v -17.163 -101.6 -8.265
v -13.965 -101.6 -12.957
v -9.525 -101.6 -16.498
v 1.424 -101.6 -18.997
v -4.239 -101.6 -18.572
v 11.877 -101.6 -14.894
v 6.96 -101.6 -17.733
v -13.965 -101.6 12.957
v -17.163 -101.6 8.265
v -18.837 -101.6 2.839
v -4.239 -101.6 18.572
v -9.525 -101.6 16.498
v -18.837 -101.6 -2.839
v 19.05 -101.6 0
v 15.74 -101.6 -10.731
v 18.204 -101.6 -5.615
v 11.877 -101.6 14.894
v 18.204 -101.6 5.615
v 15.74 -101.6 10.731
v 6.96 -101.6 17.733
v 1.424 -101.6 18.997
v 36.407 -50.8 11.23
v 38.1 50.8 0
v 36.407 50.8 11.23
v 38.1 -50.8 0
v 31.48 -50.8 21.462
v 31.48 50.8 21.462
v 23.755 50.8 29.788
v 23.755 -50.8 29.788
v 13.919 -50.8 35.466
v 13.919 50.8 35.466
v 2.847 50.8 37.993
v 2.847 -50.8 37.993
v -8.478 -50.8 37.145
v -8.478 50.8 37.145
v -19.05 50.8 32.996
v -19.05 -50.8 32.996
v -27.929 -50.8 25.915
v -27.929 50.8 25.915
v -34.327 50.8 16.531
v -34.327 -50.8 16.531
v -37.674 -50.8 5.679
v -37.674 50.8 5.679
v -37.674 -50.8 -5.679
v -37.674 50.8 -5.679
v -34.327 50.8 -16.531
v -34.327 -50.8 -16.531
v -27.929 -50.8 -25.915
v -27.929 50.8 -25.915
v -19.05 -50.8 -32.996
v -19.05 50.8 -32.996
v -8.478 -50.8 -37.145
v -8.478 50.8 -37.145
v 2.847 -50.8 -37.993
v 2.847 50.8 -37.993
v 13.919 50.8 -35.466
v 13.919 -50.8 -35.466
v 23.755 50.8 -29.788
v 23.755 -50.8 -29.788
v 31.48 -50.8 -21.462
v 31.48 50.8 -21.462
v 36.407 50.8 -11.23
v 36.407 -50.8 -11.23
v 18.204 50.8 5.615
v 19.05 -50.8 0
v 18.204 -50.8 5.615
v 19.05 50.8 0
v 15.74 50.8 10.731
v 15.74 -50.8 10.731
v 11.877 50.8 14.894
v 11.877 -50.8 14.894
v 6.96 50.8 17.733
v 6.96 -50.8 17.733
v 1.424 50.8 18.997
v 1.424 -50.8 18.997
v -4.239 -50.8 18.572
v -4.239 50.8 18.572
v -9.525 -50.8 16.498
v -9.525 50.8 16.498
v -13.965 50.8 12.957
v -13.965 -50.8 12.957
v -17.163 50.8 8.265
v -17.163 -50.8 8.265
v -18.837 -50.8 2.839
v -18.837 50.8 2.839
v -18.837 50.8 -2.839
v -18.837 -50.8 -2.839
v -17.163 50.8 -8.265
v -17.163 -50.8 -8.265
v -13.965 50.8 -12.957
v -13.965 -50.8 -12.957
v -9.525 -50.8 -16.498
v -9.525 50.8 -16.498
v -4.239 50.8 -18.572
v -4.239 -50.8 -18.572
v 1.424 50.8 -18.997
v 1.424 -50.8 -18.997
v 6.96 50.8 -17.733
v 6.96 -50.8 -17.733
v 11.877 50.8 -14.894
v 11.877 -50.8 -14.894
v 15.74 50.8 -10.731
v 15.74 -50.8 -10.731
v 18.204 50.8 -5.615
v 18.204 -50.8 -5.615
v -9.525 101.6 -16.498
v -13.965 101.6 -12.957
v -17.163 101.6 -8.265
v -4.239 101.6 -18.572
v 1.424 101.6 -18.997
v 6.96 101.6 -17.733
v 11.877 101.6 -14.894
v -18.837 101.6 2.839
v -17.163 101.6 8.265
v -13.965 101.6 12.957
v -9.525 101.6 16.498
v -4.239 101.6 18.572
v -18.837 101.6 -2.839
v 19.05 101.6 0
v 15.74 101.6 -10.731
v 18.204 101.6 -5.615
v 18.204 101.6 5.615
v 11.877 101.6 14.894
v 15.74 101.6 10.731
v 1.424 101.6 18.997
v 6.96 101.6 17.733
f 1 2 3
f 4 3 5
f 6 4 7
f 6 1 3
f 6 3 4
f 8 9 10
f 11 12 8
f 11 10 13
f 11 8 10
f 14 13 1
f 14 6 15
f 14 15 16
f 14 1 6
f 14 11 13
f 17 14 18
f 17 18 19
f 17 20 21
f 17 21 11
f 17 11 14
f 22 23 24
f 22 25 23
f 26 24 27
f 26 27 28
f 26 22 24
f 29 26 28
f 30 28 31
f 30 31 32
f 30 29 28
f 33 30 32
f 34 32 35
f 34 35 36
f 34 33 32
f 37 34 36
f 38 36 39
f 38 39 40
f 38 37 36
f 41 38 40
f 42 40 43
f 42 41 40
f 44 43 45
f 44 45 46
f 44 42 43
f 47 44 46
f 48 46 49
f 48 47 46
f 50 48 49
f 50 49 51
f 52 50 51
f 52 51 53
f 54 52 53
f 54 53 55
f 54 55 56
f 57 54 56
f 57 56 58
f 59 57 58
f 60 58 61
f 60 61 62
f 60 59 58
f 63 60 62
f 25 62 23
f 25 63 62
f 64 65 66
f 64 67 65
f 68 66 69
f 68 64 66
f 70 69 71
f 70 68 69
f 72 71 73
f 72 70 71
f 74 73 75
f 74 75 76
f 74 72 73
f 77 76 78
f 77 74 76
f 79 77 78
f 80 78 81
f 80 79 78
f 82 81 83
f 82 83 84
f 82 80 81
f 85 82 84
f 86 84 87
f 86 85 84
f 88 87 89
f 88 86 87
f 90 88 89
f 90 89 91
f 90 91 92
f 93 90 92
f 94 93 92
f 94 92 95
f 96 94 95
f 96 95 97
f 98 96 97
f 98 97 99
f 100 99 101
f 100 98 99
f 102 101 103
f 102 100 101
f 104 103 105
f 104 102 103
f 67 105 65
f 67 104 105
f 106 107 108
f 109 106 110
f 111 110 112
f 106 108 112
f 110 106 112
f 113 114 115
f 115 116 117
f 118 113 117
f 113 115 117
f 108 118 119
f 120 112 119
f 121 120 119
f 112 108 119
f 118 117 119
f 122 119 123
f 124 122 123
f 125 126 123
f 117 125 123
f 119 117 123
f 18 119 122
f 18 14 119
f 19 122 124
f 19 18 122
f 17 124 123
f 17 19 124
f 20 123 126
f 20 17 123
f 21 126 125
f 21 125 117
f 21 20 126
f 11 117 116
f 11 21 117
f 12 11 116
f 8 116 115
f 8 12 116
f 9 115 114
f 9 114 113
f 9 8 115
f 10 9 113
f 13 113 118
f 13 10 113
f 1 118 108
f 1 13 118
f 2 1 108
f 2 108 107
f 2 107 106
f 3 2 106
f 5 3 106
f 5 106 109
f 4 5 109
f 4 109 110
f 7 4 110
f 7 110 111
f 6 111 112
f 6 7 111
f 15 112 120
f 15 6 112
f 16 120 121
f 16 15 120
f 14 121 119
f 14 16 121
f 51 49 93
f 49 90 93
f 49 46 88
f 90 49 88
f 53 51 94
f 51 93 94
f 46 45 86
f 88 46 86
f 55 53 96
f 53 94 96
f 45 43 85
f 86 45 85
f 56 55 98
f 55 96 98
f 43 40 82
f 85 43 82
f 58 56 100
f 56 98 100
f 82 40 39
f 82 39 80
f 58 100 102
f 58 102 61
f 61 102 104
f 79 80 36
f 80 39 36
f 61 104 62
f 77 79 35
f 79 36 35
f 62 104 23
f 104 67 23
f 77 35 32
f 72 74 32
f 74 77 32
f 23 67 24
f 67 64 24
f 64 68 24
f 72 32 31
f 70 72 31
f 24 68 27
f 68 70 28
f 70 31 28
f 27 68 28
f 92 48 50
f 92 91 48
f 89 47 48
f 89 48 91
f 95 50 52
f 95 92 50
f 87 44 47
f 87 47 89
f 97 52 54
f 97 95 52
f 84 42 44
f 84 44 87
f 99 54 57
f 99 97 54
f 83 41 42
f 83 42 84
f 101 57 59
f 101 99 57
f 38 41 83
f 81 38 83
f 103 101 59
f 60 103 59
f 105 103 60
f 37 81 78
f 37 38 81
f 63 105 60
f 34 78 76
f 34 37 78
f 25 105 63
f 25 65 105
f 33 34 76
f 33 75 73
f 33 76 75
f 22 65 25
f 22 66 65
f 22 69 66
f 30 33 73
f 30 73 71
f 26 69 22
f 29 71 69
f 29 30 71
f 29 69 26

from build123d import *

# Parameters (mm, degrees)
F0_R     = 38.1
F0_R_2   = 19.05
F1_DEPTH = 50.8
F2_R     = 19.05
F3_DEPTH = 101.6


# Not quite as in the source:
# - a feature names something its author has since deleted; it is built from what else it names


with BuildPart() as f1:
    # F0 (on Front) → F1 (new body, symmetric)
    with BuildSketch(Plane.XZ):
        Circle(F0_R)
        Circle(F0_R_2, mode=Mode.SUBTRACT)
    extrude(amount=F1_DEPTH, both=True)


with BuildPart() as f3:
    # F2 (on face) → F3 (new body, symmetric)
    with BuildSketch(Plane.XZ):
        Circle(F2_R)
    extrude(amount=F3_DEPTH, both=True)


solid = Compound([f1.part, f3.part])
